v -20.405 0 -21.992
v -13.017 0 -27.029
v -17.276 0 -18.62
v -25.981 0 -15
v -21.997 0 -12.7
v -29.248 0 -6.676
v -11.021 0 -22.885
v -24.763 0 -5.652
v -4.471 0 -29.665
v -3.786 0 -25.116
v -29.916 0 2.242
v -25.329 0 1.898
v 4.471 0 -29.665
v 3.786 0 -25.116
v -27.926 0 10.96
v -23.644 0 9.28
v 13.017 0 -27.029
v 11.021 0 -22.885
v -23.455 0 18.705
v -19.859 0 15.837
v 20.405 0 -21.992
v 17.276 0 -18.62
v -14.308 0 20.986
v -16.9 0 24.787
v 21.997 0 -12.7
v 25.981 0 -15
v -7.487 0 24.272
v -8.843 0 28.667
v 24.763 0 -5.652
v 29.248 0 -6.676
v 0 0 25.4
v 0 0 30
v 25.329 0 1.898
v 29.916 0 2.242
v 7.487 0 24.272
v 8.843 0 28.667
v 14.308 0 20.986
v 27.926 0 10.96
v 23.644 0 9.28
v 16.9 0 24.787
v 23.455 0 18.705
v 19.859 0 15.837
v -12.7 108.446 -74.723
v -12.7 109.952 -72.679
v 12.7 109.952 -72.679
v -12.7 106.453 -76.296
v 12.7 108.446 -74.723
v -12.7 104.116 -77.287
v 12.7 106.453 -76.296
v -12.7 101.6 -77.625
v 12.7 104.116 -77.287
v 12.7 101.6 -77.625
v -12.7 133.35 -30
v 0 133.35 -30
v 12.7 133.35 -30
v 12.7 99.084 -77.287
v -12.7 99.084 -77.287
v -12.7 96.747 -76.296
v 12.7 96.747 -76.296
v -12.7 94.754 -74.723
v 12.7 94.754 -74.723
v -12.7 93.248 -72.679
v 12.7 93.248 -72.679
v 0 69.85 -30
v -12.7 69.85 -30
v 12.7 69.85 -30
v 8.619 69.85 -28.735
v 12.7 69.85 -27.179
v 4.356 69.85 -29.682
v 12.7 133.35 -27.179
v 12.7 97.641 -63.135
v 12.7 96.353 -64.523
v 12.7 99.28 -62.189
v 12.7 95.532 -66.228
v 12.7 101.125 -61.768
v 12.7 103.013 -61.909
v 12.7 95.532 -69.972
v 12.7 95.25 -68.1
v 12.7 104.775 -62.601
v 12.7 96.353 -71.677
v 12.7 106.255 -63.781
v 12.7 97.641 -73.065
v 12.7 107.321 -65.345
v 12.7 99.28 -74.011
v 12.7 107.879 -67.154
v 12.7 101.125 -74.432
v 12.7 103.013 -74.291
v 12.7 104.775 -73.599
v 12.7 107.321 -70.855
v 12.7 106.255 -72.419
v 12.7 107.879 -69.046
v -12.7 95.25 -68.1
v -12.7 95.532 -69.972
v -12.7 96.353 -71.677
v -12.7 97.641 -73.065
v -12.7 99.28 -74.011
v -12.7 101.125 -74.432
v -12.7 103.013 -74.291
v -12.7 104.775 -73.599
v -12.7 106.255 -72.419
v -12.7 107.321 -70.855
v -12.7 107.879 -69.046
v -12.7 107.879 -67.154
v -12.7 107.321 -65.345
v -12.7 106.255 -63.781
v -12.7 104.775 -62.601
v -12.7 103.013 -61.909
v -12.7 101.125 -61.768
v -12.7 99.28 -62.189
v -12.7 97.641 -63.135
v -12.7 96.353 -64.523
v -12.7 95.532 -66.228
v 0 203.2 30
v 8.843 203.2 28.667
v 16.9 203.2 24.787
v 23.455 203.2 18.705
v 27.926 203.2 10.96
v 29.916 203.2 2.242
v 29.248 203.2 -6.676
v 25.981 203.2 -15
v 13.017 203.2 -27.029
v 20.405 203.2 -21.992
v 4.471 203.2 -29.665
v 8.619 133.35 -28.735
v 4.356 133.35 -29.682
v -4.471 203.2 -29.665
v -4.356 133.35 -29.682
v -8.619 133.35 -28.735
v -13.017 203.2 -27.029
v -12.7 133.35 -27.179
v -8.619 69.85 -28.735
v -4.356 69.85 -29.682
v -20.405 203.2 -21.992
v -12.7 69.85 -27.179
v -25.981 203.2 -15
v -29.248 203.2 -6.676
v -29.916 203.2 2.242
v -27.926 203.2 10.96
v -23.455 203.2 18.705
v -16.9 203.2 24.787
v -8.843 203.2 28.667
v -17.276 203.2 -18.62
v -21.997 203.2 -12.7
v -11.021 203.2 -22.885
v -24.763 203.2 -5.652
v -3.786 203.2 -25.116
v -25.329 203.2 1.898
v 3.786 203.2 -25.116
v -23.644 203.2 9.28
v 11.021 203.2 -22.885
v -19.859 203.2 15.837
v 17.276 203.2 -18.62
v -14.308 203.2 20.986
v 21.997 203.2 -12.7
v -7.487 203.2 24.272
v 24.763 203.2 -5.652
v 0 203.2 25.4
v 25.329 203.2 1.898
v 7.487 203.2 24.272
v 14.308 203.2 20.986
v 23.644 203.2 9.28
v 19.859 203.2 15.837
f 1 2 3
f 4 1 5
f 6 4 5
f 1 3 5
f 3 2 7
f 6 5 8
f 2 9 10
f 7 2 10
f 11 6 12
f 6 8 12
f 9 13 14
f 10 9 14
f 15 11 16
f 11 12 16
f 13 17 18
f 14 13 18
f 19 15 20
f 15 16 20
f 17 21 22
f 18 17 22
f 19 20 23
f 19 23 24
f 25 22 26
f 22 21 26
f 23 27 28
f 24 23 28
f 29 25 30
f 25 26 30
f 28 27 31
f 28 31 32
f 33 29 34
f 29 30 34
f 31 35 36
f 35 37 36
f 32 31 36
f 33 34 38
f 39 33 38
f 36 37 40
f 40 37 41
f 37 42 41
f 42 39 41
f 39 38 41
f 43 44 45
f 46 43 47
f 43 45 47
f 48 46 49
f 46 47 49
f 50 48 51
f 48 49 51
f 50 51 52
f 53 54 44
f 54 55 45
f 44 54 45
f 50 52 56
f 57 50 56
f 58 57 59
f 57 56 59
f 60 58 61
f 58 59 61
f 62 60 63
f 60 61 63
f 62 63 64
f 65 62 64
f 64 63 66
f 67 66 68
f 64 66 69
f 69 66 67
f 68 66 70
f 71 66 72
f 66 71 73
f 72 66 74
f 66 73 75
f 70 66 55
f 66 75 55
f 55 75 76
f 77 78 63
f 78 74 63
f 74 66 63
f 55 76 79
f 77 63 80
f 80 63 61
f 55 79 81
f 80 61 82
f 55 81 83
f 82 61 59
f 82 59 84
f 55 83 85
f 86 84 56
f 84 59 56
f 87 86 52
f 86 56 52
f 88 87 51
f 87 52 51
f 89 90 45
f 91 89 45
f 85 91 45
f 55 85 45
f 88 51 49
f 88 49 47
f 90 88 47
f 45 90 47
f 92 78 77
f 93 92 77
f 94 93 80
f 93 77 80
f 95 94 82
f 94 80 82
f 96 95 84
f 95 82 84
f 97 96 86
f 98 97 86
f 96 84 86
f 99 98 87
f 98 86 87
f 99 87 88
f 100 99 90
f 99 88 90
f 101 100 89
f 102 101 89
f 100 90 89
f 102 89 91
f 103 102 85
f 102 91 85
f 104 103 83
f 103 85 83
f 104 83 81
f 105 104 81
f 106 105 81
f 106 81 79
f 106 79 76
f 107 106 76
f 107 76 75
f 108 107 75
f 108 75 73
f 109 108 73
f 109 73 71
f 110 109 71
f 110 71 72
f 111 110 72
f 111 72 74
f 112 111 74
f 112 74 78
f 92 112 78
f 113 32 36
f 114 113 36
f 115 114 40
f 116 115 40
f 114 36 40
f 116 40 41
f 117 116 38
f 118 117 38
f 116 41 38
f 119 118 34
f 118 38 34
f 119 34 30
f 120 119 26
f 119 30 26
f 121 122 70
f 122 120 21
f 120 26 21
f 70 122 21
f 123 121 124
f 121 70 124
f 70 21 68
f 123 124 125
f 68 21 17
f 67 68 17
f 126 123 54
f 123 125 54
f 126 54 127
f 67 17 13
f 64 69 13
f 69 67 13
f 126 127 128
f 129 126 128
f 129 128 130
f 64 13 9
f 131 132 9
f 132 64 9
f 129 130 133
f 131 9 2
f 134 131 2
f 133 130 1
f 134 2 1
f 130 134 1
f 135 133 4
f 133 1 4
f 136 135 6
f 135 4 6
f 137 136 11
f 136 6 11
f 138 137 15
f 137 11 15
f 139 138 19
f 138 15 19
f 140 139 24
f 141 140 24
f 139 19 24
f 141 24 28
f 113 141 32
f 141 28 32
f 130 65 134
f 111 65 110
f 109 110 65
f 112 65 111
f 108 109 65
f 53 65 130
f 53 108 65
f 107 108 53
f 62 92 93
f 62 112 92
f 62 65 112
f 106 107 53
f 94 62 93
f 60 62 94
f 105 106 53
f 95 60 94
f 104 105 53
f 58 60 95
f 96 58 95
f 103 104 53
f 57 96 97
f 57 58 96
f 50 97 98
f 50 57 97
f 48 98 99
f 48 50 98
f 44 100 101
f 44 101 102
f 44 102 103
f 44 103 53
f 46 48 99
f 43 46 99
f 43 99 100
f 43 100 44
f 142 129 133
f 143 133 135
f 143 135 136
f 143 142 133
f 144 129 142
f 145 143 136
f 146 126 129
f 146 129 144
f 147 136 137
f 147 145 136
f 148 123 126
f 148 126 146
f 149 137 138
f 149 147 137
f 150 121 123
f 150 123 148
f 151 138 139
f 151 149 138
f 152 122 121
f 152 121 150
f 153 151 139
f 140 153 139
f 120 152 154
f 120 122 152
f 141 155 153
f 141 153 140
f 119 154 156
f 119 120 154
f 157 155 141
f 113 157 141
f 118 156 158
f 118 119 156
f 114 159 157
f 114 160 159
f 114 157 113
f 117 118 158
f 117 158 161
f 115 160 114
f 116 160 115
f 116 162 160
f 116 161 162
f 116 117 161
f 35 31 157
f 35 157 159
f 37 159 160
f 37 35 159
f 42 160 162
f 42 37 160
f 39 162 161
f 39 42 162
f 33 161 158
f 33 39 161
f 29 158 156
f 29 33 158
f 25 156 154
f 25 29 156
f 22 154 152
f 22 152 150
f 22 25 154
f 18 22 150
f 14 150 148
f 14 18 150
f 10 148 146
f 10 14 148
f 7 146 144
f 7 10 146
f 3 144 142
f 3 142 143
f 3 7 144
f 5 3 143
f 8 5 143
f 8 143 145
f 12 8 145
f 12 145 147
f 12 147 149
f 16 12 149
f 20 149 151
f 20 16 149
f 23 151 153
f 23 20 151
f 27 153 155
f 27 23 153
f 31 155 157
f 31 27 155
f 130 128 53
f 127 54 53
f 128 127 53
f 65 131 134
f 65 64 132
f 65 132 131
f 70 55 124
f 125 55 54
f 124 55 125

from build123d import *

# Parameters (mm, degrees)
SKETCH1_R                            = 30
SKETCH1_R_2                          = 25.4
BOSS_EXTRUDE1_DEPTH                  = 203.2
SKETCH2_W                            = 25.4
SKETCH2_H                            = 63.5
BOSS_EXTRUDE2_DEPTH                  = 50.8
BOSS_EXTRUDE2_DIRECTION_2_REACH      = 215.987
BOSS_EXTRUDE2_DIRECTION_2_END_RADIUS = 30
CUT_EXTRUDE3_REACH                   = 224.805
SKETCH3_R                            = 6.35
CUT_EXTRUDE3_DIRECTION_2_DEPTH       = 223.805228843


with BuildPart() as part:
    # Sketch1 → Boss-Extrude1 (new body)
    with BuildSketch(Plane(origin=(0, 0, 0), x_dir=(1, 0, 0), z_dir=(0, 1, 0))):
        with Locations(Location((0, 0, 0), (0, 0, 270))):
            Circle(SKETCH1_R)
        with Locations(Location((0, 0, 0), (0, 0, 270))):
            Circle(SKETCH1_R_2, mode=Mode.SUBTRACT)
    extrude(amount=BOSS_EXTRUDE1_DEPTH)

    # Sketch2 → Boss-Extrude2 (add)
    with BuildSketch(Plane(origin=(0, 0, -30), x_dir=(-1, 0, 0), z_dir=(0, 0, -1))):
        with Locations((0, 101.6)):
            Rectangle(SKETCH2_W, SKETCH2_H)
    extrude(amount=BOSS_EXTRUDE2_DEPTH)

    # Boss-Extrude2 direction 2: up to this cylinder (the profile starts outside it)
    boss_extrude2_direction_2_end = Plane(origin=(0, 101.6, 0), z_dir=(0, -1, 0)) * Cylinder(BOSS_EXTRUDE2_DIRECTION_2_END_RADIUS, 492.974, mode=Mode.PRIVATE)
    # Sketch2 → Boss-Extrude2 direction 2 (add, up to the surface)
    with BuildSketch(Plane(origin=(0, 0, -30), x_dir=(-1, 0, 0), z_dir=(0, 0, -1)), mode=Mode.PRIVATE) as boss_extrude2_direction_2_sk1:
        with Locations((0, 101.6)):
            Rectangle(SKETCH2_W, SKETCH2_H)
    boss_extrude2_direction_2_tool1 = extrude(boss_extrude2_direction_2_sk1.sketch, amount=-BOSS_EXTRUDE2_DIRECTION_2_REACH, mode=Mode.PRIVATE) - boss_extrude2_direction_2_end
    add(boss_extrude2_direction_2_tool1.solids().sort_by_distance((0, 101.6, -30))[0])
    add(boss_extrude2_direction_2_tool1.solids().sort_by_distance((0, 101.6, -30))[1])

    # Sketch3 → Cut-Extrude3 (cut, up to next)
    with BuildSketch(Plane(origin=(12.7, 0, 0), x_dir=(0, 0, -1), z_dir=(1, 0, 0)), mode=Mode.PRIVATE) as cut_extrude3_sk1:
        with BuildLine():
            Line((72.678913322, 93.247804014), (30, 69.85))
            Line((30, 69.85), (80.8, 69.85))
            Line((80.8, 69.85), (80.8, 133.35))
            Line((80.8, 133.35), (30, 133.35))
            Line((30, 133.35), (72.678913322, 109.952195986))
            ThreePointArc((72.678913322, 109.952195986), (76.295723714, 106.453425368), (77.625, 101.6))
            ThreePointArc((77.625, 101.6), (76.295723714, 96.746574632), (72.678913322, 93.247804014))
        make_face()
    cut_extrude3_tool1 = extrude(cut_extrude3_sk1.sketch, amount=-CUT_EXTRUDE3_REACH, mode=Mode.PRIVATE) & part.part
    # Sketch3 → Cut-Extrude3 (cut, up to next)
    with BuildSketch(Plane(origin=(12.7, 0, 0), x_dir=(0, 0, -1), z_dir=(1, 0, 0)), mode=Mode.PRIVATE) as cut_extrude3_sk2:
        with Locations(Location((68.1, 101.6, 0), (0, 0, 270))):
            Circle(SKETCH3_R)
    cut_extrude3_tool2 = extrude(cut_extrude3_sk2.sketch, amount=-CUT_EXTRUDE3_REACH, mode=Mode.PRIVATE) & part.part
    add(cut_extrude3_tool1.solids().sort_by_distance((12.7, 80.835833, -51.730381))[0], mode=Mode.SUBTRACT)
    add(cut_extrude3_tool2.solids().sort_by_distance((12.7, 101.6, -68.1))[0], mode=Mode.SUBTRACT)

    # Sketch3 → Cut-Extrude3 direction 2 (cut)
    with BuildSketch(Plane(origin=(12.7, 0, 0), x_dir=(0, 0, -1), z_dir=(1, 0, 0))):
        with BuildLine():
            Line((72.678913322, 93.247804014), (30, 69.85))
            Line((30, 69.85), (80.8, 69.85))
            Line((80.8, 69.85), (80.8, 133.35))
            Line((80.8, 133.35), (30, 133.35))
            Line((30, 133.35), (72.678913322, 109.952195986))
            ThreePointArc((72.678913322, 109.952195986), (76.295723714, 106.453425368), (77.625, 101.6))
            ThreePointArc((77.625, 101.6), (76.295723714, 96.746574632), (72.678913322, 93.247804014))
        make_face()
        with Locations(Location((68.1, 101.6, 0), (0, 0, 270))):
            Circle(SKETCH3_R)
    extrude(amount=CUT_EXTRUDE3_DIRECTION_2_DEPTH, mode=Mode.SUBTRACT)


solid = part.part
